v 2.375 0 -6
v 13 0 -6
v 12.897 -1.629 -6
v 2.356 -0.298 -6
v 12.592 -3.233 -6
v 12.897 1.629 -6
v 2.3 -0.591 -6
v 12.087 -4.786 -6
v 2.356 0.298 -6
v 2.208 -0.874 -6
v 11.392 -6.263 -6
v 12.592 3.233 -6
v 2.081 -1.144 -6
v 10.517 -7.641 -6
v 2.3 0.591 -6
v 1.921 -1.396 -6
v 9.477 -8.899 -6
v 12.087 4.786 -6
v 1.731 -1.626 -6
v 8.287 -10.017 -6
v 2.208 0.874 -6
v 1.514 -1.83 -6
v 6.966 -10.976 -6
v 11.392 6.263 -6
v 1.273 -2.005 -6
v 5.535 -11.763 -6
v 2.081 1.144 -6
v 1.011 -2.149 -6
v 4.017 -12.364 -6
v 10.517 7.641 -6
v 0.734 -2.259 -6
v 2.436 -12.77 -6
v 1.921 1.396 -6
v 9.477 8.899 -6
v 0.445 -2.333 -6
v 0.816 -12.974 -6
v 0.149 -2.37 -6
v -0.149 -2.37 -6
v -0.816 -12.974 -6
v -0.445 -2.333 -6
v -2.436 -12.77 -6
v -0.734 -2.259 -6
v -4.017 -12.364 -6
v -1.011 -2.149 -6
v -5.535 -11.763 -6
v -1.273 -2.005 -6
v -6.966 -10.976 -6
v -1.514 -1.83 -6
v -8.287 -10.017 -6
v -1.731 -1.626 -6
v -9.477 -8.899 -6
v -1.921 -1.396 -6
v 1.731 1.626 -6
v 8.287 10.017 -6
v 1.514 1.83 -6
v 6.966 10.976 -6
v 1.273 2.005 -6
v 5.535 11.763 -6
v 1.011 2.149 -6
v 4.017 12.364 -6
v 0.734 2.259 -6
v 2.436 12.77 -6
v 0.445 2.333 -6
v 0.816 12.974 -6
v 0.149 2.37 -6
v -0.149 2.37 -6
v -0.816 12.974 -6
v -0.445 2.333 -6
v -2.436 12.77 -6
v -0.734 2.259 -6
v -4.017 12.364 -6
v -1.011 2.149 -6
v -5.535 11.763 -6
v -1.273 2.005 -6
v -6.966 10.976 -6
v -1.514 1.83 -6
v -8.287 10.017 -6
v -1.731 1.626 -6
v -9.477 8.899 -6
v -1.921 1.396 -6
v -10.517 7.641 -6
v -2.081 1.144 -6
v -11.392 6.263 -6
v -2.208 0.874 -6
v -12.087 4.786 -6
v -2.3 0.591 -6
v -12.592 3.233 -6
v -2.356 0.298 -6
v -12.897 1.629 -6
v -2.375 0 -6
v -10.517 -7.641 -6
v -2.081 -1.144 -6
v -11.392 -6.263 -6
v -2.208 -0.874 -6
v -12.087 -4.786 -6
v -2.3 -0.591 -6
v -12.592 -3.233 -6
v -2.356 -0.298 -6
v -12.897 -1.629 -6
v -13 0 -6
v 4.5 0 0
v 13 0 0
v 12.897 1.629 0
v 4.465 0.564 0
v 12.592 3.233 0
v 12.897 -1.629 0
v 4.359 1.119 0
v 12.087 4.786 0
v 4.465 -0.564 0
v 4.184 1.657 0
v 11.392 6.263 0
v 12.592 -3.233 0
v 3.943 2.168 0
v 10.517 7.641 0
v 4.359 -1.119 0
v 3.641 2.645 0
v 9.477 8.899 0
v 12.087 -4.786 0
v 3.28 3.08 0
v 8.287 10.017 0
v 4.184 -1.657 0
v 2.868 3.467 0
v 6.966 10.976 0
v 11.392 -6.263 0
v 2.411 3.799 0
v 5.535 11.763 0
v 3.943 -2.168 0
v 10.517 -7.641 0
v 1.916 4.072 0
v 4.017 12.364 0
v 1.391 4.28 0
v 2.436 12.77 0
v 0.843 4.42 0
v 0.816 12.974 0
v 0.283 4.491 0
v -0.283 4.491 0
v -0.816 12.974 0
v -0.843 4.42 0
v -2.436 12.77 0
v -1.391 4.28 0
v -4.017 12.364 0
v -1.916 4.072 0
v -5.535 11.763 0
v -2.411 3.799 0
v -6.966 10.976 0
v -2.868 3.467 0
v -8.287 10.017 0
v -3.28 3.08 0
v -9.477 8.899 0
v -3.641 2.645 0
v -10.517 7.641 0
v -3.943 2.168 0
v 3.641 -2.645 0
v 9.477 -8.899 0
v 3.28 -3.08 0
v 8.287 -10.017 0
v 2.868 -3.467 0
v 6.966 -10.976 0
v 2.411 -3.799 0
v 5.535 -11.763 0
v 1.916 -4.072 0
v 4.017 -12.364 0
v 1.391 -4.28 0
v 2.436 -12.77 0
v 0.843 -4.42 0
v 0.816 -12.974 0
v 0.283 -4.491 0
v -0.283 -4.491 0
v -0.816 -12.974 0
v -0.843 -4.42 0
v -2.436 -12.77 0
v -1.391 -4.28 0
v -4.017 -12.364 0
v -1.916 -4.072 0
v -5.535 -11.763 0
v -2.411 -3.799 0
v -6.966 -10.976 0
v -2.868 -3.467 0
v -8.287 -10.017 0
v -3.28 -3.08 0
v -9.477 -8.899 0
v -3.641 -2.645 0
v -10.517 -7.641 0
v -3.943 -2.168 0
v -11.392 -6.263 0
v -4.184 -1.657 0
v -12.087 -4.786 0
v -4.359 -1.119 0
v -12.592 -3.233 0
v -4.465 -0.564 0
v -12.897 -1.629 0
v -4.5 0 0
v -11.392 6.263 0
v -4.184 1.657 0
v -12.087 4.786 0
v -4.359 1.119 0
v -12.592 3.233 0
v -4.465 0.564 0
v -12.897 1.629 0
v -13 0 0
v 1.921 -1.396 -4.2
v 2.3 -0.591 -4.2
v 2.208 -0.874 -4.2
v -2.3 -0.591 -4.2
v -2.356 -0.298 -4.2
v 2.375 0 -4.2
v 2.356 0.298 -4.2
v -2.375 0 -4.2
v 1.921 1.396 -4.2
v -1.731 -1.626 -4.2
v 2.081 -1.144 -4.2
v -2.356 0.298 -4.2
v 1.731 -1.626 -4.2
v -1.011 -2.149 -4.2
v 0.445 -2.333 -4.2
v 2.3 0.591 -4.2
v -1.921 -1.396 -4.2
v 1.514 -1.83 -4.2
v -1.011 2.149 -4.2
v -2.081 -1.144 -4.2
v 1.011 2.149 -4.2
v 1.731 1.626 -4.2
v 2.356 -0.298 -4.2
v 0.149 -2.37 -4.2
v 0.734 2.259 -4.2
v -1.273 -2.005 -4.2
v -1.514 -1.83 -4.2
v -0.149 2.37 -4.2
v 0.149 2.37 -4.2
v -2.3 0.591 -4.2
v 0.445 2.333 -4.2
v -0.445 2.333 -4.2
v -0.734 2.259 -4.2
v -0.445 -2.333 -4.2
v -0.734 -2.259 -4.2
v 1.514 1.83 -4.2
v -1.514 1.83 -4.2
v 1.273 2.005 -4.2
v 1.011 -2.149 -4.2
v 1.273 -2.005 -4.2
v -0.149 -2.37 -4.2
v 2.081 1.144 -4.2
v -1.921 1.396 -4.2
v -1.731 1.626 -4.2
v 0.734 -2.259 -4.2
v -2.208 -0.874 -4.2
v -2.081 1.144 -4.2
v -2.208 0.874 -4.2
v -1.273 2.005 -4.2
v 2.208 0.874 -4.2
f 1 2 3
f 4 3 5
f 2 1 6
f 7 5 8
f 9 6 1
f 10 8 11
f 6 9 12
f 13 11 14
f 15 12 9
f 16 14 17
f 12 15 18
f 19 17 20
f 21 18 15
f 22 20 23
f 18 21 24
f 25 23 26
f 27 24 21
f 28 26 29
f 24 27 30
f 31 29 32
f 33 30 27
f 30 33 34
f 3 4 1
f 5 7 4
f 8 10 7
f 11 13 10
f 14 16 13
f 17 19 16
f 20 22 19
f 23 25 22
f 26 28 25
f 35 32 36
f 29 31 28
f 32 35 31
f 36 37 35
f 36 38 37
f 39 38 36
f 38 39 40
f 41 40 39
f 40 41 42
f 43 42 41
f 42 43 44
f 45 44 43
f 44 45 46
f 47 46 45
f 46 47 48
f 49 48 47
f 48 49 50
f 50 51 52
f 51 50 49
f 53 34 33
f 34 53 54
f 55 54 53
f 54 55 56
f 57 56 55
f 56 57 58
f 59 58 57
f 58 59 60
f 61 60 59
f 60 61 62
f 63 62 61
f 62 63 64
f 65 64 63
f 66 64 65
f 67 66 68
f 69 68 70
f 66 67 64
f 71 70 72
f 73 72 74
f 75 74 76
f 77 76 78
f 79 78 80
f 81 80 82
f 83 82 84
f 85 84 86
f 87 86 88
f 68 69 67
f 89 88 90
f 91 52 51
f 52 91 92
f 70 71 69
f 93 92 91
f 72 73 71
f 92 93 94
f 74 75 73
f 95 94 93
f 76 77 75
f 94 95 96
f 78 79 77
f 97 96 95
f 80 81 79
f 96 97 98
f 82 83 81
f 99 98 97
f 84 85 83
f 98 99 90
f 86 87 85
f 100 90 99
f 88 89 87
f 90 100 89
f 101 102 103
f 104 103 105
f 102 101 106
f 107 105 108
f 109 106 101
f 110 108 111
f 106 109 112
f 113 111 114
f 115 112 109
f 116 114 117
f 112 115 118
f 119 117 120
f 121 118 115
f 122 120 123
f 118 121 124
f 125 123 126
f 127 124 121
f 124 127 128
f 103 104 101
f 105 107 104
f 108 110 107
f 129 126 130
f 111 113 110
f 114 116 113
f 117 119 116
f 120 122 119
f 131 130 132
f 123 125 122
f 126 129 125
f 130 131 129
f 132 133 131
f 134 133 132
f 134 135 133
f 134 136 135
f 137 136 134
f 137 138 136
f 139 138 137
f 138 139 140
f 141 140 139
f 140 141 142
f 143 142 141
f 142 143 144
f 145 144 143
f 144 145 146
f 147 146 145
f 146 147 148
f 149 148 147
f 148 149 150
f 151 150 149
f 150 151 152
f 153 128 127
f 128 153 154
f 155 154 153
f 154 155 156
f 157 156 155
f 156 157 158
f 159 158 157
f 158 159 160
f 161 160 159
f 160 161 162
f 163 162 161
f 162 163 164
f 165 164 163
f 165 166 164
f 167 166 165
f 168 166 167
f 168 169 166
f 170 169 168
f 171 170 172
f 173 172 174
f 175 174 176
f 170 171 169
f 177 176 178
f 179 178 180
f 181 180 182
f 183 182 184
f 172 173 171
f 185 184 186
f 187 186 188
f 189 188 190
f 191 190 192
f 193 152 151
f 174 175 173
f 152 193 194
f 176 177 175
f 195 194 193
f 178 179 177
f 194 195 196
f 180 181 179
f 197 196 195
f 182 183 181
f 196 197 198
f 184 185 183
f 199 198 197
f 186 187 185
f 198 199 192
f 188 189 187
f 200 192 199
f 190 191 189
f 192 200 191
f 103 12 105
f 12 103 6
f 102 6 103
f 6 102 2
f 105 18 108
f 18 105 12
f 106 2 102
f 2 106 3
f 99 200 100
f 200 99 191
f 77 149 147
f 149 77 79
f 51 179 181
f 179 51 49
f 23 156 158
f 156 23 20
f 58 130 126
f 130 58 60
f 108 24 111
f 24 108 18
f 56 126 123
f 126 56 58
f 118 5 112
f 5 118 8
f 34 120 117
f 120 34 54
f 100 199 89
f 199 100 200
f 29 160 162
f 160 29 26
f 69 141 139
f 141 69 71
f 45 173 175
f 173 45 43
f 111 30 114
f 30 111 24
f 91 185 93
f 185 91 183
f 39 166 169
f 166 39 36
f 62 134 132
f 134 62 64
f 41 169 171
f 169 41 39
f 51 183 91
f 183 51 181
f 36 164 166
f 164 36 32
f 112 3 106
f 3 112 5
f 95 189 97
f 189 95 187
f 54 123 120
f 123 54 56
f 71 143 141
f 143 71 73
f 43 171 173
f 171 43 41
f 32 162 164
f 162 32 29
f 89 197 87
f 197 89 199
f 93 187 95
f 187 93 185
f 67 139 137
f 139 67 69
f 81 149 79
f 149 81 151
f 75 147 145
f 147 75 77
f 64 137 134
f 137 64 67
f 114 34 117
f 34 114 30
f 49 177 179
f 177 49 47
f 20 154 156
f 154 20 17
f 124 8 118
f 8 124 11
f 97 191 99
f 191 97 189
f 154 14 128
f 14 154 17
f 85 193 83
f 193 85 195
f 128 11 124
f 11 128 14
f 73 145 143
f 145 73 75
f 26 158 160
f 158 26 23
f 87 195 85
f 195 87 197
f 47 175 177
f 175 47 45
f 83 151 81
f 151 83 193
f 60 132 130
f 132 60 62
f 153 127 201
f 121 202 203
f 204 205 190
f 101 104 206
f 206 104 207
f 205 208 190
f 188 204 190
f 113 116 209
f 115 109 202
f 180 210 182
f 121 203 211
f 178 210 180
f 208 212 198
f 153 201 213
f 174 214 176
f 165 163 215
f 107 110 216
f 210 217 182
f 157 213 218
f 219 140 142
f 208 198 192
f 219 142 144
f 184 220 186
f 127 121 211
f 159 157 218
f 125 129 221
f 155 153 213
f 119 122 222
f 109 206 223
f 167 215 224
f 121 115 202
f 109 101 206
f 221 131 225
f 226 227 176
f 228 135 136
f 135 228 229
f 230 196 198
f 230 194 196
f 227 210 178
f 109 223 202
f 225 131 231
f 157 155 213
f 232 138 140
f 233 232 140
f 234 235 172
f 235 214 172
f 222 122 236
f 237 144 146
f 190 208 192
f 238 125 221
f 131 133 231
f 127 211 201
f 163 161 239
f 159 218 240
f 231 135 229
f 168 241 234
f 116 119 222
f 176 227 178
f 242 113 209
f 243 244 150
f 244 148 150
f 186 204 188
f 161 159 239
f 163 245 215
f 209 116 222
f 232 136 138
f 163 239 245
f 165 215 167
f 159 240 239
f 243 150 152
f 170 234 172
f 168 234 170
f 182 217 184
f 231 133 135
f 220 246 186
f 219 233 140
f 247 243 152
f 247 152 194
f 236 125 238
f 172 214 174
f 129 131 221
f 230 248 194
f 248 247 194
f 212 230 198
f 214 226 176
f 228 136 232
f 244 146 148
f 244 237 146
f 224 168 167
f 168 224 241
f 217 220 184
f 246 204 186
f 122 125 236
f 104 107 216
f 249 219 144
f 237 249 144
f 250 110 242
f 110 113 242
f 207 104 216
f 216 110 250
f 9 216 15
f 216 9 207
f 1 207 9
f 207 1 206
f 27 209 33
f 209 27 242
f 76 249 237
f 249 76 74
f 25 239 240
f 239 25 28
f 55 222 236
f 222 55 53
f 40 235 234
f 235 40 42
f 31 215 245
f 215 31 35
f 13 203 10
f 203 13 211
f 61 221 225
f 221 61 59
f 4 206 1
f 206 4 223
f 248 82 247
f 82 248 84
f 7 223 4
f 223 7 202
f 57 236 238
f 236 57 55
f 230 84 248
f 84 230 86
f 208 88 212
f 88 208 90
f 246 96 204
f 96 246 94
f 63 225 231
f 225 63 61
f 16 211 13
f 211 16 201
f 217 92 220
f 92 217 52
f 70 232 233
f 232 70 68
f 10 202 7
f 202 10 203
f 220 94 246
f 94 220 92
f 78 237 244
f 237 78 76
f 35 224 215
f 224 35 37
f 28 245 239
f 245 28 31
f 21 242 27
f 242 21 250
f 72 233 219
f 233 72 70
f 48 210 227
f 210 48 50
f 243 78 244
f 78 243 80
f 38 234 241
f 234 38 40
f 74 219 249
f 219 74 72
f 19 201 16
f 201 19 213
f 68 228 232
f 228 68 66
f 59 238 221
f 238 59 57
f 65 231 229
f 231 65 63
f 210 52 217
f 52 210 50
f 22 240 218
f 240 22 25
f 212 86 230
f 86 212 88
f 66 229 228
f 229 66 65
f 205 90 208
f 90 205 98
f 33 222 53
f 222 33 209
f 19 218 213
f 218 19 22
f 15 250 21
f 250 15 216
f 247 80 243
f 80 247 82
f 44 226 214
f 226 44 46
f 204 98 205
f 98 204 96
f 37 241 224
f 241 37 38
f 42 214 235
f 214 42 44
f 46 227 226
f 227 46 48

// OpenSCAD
$fn = 50;


difference() {
	union() {
		translate(v = [0, 0, -6.0000000000]) {
			cylinder(h = 6, r = 10.0000000000);
		}
		translate(v = [0, 0, -6.0000000000]) {
			cylinder(h = 6, r = 13.0000000000);
		}
	}
	union() {
		translate(v = [0, 0, 0]) {
			rotate(a = [0, 0, 0]) {
				difference() {
					union() {
						#translate(v = [0, 0, -6.0000000000]) {
							cylinder(h = 6, r = 2.2500000000);
						}
						#translate(v = [0, 0, -4.2000000000]) {
							cylinder(h = 4.2000000000, r = 10.0000000000, r1 = 2.3750000000, r2 = 4.5000000000);
						}
						#translate(v = [0, 0, -6.0000000000]) {
							cylinder(h = 6, r = 2.3750000000);
						}
						#translate(v = [0, 0, -6.0000000000]) {
							cylinder(h = 6, r = 2.2500000000);
						}
					}
					union();
				}
			}
		}
	}
}
